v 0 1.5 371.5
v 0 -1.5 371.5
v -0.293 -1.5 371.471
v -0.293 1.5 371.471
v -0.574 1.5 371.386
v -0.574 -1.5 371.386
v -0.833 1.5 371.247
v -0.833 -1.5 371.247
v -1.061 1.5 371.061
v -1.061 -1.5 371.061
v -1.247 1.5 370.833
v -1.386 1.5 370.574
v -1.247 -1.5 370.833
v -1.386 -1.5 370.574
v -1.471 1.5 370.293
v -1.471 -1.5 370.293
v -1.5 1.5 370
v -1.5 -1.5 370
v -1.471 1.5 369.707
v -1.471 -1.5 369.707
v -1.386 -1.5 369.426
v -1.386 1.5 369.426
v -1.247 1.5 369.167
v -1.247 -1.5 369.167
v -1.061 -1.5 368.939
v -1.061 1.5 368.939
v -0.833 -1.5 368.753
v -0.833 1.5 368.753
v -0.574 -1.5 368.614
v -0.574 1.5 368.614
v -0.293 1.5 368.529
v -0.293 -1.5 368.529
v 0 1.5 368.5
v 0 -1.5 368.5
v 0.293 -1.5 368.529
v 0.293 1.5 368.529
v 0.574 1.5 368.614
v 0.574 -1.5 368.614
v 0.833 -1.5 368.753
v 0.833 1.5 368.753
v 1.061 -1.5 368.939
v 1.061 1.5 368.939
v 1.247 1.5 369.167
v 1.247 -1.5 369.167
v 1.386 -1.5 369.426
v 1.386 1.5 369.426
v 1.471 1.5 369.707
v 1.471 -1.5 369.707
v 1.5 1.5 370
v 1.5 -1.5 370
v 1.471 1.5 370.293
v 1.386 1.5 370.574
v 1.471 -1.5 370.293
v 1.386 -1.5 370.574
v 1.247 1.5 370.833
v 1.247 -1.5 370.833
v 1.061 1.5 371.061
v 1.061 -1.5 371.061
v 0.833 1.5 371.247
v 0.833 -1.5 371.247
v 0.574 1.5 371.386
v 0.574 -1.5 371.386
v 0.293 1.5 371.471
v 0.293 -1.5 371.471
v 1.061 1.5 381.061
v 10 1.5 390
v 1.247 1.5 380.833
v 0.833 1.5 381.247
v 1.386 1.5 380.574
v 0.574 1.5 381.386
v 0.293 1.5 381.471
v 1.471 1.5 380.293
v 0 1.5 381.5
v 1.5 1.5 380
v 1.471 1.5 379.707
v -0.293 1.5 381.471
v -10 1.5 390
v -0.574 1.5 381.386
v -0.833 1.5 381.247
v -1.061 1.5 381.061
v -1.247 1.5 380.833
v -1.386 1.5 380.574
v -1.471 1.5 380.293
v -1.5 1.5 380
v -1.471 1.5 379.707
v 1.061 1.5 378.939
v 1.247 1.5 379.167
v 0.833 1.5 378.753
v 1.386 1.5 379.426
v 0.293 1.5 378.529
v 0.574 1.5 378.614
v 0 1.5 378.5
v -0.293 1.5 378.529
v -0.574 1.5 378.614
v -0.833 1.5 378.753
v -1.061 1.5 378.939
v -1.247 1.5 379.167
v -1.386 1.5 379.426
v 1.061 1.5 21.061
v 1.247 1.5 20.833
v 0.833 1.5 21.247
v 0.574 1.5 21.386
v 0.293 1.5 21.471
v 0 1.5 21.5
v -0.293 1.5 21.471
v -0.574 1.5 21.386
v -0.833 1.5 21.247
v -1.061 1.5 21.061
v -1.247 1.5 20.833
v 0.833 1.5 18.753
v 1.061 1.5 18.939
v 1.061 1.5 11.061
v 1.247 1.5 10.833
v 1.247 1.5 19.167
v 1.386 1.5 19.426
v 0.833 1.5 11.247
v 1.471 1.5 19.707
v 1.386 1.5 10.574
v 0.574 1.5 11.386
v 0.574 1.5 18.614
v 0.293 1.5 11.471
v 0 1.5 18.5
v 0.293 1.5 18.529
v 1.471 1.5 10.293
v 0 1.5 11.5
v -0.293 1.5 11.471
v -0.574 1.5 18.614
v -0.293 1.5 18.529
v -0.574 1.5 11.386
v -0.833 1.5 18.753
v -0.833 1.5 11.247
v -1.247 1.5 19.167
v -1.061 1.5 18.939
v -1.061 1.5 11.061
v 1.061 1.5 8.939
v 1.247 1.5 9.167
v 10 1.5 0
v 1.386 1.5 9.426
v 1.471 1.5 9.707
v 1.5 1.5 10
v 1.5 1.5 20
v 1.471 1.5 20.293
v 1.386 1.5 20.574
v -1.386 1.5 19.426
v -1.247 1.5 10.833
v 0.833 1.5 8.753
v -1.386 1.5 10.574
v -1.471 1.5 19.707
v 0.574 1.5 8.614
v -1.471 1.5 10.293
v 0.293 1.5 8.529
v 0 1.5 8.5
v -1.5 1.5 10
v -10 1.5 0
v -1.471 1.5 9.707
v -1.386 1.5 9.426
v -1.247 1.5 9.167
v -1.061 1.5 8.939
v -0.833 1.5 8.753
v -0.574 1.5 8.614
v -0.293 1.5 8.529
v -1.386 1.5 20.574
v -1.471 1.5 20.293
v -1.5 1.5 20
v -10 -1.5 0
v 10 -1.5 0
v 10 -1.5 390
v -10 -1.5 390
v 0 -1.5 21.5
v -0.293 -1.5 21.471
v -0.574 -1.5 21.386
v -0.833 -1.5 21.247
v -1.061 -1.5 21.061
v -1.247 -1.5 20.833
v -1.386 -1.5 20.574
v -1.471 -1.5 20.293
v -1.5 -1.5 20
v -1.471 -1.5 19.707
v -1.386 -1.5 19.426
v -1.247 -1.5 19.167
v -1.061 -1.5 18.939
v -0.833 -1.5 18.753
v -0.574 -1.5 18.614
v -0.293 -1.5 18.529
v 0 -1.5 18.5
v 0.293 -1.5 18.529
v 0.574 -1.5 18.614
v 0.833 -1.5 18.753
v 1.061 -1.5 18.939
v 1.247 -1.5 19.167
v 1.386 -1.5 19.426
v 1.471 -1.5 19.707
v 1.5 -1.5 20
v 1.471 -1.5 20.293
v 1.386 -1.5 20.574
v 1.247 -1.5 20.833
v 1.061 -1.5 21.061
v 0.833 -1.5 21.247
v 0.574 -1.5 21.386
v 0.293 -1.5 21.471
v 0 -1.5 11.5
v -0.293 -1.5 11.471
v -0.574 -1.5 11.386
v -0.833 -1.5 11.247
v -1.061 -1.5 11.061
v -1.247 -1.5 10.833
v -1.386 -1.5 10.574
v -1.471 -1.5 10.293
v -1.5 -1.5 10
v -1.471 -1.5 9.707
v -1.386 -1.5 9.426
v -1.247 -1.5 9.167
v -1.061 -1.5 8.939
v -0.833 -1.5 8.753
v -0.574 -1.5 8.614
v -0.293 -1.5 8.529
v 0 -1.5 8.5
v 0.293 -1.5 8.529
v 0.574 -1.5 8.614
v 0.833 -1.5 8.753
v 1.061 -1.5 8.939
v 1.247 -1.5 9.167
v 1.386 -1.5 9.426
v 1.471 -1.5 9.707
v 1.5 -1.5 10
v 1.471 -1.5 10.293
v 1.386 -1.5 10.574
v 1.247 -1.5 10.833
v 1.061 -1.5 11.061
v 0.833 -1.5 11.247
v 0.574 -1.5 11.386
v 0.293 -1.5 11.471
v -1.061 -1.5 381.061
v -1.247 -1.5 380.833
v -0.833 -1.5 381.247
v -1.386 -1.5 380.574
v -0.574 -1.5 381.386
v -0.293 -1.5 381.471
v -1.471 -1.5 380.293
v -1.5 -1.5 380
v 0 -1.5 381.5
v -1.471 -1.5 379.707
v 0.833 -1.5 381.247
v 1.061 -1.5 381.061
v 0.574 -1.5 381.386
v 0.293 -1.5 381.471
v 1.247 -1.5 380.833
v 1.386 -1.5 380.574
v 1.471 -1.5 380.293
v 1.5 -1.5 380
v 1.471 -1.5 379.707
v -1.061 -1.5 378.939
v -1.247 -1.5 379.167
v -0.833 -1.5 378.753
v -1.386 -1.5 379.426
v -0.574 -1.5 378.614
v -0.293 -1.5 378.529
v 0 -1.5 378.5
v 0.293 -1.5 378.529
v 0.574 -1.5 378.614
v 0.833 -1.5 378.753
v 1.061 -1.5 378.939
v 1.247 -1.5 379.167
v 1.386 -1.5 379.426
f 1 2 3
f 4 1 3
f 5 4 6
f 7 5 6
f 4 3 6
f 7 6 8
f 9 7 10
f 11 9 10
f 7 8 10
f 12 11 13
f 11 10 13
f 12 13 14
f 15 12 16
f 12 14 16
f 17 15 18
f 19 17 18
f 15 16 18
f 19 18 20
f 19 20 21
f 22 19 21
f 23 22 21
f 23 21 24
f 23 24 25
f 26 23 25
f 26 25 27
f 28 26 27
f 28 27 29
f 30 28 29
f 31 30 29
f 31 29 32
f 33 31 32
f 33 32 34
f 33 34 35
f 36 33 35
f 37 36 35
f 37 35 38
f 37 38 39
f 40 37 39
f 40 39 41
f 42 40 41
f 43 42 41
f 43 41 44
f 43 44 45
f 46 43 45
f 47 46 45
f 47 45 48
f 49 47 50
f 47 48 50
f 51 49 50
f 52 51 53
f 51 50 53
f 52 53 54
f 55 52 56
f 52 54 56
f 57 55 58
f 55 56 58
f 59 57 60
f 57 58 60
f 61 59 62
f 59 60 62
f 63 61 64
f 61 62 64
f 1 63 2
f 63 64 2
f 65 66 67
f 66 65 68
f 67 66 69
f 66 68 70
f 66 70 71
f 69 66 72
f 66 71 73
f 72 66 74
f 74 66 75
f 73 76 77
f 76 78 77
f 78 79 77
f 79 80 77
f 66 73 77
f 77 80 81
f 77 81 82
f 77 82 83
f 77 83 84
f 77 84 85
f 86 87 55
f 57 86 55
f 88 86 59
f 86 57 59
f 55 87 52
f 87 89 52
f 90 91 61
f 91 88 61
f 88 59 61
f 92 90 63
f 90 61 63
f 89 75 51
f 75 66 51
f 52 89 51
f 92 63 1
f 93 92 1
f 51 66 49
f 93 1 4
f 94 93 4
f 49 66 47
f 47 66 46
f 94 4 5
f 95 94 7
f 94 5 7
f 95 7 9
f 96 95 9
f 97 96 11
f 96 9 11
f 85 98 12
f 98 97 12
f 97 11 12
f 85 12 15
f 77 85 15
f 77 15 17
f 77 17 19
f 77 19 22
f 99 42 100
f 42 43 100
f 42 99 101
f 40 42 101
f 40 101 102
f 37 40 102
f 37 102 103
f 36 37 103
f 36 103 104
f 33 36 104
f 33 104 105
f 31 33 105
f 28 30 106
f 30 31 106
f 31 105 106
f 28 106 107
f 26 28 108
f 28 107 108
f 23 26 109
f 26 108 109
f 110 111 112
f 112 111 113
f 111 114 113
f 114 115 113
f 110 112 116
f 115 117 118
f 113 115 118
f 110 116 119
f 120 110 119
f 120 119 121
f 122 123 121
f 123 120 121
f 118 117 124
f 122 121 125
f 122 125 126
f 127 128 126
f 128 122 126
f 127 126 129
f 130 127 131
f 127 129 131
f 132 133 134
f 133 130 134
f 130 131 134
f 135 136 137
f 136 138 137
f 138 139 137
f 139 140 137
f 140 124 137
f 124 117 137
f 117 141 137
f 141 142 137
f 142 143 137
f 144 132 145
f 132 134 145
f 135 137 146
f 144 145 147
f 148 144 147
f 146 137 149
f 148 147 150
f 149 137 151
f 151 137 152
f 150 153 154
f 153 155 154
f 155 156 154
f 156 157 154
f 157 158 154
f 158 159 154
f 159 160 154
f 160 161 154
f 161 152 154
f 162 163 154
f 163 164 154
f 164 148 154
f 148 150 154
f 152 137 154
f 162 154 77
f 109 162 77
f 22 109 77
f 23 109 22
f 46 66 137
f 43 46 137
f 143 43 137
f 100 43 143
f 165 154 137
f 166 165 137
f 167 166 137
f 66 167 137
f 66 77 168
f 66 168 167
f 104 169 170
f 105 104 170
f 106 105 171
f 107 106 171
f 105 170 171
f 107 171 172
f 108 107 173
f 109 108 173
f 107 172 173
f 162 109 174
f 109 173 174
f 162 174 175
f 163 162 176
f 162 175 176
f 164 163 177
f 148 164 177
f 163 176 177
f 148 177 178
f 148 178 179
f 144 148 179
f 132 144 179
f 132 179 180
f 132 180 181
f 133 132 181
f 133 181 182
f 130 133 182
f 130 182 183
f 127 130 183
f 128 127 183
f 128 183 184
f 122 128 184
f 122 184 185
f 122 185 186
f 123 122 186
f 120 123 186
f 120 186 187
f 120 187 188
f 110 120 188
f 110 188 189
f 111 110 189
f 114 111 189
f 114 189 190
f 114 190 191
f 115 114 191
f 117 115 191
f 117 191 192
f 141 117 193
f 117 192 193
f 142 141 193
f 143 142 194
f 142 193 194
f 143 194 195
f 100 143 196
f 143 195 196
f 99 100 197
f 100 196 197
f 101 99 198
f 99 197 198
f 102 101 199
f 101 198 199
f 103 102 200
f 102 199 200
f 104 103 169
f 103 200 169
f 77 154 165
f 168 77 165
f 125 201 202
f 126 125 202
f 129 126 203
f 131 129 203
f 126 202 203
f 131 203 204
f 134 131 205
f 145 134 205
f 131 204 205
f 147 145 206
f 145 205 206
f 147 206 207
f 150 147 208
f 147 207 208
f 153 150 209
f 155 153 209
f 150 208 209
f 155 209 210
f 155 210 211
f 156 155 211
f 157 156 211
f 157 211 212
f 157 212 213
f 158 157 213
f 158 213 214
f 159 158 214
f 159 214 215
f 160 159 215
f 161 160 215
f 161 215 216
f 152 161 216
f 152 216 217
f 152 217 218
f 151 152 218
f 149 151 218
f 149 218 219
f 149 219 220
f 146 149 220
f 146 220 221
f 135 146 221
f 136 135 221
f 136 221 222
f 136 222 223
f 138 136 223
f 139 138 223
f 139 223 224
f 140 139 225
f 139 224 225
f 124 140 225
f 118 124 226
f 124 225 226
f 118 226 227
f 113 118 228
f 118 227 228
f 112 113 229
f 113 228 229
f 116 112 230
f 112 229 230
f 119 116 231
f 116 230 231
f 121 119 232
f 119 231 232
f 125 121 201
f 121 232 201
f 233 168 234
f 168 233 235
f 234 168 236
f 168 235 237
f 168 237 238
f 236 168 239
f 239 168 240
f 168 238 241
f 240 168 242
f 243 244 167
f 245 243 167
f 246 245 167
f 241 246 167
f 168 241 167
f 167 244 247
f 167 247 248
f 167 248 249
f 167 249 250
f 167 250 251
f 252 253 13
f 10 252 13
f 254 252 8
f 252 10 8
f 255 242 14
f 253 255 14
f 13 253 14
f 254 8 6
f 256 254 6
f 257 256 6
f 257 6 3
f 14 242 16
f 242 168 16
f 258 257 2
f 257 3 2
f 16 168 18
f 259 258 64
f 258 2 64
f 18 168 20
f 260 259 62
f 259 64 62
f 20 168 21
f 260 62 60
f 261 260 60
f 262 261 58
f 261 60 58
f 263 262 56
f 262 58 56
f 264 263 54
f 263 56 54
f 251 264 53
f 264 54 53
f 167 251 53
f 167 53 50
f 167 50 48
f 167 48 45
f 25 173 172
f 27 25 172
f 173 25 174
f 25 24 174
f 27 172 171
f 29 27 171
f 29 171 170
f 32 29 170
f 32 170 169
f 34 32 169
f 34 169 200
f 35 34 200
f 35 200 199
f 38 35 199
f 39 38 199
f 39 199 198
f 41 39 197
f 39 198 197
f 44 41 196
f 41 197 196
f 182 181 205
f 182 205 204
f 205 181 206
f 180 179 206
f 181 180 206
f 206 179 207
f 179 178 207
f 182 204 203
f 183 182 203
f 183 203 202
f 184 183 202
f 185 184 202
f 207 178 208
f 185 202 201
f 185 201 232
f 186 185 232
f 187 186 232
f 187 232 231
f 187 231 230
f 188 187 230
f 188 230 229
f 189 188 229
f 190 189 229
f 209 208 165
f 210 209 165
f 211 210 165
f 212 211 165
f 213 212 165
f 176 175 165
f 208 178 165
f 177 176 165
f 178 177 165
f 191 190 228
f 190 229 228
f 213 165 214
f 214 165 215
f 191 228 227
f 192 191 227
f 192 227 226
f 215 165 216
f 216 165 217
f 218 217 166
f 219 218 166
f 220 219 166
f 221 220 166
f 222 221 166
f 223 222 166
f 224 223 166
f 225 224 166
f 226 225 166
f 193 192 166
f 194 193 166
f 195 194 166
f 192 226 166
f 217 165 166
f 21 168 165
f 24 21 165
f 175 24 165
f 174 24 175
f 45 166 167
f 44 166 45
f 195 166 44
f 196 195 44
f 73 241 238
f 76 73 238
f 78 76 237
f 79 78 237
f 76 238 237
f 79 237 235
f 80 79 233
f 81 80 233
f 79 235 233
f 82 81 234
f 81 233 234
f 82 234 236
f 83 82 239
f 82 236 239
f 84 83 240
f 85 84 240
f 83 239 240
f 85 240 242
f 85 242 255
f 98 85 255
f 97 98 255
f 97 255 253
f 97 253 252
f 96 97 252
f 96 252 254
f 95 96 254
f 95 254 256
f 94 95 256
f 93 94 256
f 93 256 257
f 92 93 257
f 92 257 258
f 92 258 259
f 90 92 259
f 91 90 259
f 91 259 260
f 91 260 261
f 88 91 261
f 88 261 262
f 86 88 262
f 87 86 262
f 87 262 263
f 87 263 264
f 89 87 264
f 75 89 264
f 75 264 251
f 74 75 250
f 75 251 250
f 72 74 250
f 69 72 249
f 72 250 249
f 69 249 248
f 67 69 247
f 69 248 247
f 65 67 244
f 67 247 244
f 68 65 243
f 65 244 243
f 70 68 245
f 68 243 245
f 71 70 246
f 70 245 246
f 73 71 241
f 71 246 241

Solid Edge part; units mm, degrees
sketch "Sketch1" plane through (0, 0, 0) normal (0, 0, 1) x (1, 0, 0)
  line L0 (-10, -1.5) -> (10, -1.5)
  line L1 (10, -1.5) -> (10, 1.5)
  line L2 (10, 1.5) -> (-10, 1.5)
  line L3 (-10, 1.5) -> (-10, -1.5)
  dimension "D1" = 20
  dimension "D2" = 3
  dimension "D3" = 1.5
  dimension "D4" = 10
extrude "Protrusion1" add sketch "Sketch1" along normal blind 390
sketch "Sketch2" plane through (0, -1.5, 167.5) normal (0, -1, 0) x (0, 0, 1)
  circle A0 centre (-157.5, 0) radius 1.5
  circle A1 centre (-147.5, 0) radius 1.5
  circle A2 centre (212.5, 0) radius 1.5
  circle A3 centre (202.5, 0) radius 1.5
  dimension "D1" = 10
  dimension "D2" = 10
  dimension "D3" = 10
  dimension "D4" = 10
extrude "VaciadoExtruido_1" cut sketch "Sketch2" along normal mid plane 318
